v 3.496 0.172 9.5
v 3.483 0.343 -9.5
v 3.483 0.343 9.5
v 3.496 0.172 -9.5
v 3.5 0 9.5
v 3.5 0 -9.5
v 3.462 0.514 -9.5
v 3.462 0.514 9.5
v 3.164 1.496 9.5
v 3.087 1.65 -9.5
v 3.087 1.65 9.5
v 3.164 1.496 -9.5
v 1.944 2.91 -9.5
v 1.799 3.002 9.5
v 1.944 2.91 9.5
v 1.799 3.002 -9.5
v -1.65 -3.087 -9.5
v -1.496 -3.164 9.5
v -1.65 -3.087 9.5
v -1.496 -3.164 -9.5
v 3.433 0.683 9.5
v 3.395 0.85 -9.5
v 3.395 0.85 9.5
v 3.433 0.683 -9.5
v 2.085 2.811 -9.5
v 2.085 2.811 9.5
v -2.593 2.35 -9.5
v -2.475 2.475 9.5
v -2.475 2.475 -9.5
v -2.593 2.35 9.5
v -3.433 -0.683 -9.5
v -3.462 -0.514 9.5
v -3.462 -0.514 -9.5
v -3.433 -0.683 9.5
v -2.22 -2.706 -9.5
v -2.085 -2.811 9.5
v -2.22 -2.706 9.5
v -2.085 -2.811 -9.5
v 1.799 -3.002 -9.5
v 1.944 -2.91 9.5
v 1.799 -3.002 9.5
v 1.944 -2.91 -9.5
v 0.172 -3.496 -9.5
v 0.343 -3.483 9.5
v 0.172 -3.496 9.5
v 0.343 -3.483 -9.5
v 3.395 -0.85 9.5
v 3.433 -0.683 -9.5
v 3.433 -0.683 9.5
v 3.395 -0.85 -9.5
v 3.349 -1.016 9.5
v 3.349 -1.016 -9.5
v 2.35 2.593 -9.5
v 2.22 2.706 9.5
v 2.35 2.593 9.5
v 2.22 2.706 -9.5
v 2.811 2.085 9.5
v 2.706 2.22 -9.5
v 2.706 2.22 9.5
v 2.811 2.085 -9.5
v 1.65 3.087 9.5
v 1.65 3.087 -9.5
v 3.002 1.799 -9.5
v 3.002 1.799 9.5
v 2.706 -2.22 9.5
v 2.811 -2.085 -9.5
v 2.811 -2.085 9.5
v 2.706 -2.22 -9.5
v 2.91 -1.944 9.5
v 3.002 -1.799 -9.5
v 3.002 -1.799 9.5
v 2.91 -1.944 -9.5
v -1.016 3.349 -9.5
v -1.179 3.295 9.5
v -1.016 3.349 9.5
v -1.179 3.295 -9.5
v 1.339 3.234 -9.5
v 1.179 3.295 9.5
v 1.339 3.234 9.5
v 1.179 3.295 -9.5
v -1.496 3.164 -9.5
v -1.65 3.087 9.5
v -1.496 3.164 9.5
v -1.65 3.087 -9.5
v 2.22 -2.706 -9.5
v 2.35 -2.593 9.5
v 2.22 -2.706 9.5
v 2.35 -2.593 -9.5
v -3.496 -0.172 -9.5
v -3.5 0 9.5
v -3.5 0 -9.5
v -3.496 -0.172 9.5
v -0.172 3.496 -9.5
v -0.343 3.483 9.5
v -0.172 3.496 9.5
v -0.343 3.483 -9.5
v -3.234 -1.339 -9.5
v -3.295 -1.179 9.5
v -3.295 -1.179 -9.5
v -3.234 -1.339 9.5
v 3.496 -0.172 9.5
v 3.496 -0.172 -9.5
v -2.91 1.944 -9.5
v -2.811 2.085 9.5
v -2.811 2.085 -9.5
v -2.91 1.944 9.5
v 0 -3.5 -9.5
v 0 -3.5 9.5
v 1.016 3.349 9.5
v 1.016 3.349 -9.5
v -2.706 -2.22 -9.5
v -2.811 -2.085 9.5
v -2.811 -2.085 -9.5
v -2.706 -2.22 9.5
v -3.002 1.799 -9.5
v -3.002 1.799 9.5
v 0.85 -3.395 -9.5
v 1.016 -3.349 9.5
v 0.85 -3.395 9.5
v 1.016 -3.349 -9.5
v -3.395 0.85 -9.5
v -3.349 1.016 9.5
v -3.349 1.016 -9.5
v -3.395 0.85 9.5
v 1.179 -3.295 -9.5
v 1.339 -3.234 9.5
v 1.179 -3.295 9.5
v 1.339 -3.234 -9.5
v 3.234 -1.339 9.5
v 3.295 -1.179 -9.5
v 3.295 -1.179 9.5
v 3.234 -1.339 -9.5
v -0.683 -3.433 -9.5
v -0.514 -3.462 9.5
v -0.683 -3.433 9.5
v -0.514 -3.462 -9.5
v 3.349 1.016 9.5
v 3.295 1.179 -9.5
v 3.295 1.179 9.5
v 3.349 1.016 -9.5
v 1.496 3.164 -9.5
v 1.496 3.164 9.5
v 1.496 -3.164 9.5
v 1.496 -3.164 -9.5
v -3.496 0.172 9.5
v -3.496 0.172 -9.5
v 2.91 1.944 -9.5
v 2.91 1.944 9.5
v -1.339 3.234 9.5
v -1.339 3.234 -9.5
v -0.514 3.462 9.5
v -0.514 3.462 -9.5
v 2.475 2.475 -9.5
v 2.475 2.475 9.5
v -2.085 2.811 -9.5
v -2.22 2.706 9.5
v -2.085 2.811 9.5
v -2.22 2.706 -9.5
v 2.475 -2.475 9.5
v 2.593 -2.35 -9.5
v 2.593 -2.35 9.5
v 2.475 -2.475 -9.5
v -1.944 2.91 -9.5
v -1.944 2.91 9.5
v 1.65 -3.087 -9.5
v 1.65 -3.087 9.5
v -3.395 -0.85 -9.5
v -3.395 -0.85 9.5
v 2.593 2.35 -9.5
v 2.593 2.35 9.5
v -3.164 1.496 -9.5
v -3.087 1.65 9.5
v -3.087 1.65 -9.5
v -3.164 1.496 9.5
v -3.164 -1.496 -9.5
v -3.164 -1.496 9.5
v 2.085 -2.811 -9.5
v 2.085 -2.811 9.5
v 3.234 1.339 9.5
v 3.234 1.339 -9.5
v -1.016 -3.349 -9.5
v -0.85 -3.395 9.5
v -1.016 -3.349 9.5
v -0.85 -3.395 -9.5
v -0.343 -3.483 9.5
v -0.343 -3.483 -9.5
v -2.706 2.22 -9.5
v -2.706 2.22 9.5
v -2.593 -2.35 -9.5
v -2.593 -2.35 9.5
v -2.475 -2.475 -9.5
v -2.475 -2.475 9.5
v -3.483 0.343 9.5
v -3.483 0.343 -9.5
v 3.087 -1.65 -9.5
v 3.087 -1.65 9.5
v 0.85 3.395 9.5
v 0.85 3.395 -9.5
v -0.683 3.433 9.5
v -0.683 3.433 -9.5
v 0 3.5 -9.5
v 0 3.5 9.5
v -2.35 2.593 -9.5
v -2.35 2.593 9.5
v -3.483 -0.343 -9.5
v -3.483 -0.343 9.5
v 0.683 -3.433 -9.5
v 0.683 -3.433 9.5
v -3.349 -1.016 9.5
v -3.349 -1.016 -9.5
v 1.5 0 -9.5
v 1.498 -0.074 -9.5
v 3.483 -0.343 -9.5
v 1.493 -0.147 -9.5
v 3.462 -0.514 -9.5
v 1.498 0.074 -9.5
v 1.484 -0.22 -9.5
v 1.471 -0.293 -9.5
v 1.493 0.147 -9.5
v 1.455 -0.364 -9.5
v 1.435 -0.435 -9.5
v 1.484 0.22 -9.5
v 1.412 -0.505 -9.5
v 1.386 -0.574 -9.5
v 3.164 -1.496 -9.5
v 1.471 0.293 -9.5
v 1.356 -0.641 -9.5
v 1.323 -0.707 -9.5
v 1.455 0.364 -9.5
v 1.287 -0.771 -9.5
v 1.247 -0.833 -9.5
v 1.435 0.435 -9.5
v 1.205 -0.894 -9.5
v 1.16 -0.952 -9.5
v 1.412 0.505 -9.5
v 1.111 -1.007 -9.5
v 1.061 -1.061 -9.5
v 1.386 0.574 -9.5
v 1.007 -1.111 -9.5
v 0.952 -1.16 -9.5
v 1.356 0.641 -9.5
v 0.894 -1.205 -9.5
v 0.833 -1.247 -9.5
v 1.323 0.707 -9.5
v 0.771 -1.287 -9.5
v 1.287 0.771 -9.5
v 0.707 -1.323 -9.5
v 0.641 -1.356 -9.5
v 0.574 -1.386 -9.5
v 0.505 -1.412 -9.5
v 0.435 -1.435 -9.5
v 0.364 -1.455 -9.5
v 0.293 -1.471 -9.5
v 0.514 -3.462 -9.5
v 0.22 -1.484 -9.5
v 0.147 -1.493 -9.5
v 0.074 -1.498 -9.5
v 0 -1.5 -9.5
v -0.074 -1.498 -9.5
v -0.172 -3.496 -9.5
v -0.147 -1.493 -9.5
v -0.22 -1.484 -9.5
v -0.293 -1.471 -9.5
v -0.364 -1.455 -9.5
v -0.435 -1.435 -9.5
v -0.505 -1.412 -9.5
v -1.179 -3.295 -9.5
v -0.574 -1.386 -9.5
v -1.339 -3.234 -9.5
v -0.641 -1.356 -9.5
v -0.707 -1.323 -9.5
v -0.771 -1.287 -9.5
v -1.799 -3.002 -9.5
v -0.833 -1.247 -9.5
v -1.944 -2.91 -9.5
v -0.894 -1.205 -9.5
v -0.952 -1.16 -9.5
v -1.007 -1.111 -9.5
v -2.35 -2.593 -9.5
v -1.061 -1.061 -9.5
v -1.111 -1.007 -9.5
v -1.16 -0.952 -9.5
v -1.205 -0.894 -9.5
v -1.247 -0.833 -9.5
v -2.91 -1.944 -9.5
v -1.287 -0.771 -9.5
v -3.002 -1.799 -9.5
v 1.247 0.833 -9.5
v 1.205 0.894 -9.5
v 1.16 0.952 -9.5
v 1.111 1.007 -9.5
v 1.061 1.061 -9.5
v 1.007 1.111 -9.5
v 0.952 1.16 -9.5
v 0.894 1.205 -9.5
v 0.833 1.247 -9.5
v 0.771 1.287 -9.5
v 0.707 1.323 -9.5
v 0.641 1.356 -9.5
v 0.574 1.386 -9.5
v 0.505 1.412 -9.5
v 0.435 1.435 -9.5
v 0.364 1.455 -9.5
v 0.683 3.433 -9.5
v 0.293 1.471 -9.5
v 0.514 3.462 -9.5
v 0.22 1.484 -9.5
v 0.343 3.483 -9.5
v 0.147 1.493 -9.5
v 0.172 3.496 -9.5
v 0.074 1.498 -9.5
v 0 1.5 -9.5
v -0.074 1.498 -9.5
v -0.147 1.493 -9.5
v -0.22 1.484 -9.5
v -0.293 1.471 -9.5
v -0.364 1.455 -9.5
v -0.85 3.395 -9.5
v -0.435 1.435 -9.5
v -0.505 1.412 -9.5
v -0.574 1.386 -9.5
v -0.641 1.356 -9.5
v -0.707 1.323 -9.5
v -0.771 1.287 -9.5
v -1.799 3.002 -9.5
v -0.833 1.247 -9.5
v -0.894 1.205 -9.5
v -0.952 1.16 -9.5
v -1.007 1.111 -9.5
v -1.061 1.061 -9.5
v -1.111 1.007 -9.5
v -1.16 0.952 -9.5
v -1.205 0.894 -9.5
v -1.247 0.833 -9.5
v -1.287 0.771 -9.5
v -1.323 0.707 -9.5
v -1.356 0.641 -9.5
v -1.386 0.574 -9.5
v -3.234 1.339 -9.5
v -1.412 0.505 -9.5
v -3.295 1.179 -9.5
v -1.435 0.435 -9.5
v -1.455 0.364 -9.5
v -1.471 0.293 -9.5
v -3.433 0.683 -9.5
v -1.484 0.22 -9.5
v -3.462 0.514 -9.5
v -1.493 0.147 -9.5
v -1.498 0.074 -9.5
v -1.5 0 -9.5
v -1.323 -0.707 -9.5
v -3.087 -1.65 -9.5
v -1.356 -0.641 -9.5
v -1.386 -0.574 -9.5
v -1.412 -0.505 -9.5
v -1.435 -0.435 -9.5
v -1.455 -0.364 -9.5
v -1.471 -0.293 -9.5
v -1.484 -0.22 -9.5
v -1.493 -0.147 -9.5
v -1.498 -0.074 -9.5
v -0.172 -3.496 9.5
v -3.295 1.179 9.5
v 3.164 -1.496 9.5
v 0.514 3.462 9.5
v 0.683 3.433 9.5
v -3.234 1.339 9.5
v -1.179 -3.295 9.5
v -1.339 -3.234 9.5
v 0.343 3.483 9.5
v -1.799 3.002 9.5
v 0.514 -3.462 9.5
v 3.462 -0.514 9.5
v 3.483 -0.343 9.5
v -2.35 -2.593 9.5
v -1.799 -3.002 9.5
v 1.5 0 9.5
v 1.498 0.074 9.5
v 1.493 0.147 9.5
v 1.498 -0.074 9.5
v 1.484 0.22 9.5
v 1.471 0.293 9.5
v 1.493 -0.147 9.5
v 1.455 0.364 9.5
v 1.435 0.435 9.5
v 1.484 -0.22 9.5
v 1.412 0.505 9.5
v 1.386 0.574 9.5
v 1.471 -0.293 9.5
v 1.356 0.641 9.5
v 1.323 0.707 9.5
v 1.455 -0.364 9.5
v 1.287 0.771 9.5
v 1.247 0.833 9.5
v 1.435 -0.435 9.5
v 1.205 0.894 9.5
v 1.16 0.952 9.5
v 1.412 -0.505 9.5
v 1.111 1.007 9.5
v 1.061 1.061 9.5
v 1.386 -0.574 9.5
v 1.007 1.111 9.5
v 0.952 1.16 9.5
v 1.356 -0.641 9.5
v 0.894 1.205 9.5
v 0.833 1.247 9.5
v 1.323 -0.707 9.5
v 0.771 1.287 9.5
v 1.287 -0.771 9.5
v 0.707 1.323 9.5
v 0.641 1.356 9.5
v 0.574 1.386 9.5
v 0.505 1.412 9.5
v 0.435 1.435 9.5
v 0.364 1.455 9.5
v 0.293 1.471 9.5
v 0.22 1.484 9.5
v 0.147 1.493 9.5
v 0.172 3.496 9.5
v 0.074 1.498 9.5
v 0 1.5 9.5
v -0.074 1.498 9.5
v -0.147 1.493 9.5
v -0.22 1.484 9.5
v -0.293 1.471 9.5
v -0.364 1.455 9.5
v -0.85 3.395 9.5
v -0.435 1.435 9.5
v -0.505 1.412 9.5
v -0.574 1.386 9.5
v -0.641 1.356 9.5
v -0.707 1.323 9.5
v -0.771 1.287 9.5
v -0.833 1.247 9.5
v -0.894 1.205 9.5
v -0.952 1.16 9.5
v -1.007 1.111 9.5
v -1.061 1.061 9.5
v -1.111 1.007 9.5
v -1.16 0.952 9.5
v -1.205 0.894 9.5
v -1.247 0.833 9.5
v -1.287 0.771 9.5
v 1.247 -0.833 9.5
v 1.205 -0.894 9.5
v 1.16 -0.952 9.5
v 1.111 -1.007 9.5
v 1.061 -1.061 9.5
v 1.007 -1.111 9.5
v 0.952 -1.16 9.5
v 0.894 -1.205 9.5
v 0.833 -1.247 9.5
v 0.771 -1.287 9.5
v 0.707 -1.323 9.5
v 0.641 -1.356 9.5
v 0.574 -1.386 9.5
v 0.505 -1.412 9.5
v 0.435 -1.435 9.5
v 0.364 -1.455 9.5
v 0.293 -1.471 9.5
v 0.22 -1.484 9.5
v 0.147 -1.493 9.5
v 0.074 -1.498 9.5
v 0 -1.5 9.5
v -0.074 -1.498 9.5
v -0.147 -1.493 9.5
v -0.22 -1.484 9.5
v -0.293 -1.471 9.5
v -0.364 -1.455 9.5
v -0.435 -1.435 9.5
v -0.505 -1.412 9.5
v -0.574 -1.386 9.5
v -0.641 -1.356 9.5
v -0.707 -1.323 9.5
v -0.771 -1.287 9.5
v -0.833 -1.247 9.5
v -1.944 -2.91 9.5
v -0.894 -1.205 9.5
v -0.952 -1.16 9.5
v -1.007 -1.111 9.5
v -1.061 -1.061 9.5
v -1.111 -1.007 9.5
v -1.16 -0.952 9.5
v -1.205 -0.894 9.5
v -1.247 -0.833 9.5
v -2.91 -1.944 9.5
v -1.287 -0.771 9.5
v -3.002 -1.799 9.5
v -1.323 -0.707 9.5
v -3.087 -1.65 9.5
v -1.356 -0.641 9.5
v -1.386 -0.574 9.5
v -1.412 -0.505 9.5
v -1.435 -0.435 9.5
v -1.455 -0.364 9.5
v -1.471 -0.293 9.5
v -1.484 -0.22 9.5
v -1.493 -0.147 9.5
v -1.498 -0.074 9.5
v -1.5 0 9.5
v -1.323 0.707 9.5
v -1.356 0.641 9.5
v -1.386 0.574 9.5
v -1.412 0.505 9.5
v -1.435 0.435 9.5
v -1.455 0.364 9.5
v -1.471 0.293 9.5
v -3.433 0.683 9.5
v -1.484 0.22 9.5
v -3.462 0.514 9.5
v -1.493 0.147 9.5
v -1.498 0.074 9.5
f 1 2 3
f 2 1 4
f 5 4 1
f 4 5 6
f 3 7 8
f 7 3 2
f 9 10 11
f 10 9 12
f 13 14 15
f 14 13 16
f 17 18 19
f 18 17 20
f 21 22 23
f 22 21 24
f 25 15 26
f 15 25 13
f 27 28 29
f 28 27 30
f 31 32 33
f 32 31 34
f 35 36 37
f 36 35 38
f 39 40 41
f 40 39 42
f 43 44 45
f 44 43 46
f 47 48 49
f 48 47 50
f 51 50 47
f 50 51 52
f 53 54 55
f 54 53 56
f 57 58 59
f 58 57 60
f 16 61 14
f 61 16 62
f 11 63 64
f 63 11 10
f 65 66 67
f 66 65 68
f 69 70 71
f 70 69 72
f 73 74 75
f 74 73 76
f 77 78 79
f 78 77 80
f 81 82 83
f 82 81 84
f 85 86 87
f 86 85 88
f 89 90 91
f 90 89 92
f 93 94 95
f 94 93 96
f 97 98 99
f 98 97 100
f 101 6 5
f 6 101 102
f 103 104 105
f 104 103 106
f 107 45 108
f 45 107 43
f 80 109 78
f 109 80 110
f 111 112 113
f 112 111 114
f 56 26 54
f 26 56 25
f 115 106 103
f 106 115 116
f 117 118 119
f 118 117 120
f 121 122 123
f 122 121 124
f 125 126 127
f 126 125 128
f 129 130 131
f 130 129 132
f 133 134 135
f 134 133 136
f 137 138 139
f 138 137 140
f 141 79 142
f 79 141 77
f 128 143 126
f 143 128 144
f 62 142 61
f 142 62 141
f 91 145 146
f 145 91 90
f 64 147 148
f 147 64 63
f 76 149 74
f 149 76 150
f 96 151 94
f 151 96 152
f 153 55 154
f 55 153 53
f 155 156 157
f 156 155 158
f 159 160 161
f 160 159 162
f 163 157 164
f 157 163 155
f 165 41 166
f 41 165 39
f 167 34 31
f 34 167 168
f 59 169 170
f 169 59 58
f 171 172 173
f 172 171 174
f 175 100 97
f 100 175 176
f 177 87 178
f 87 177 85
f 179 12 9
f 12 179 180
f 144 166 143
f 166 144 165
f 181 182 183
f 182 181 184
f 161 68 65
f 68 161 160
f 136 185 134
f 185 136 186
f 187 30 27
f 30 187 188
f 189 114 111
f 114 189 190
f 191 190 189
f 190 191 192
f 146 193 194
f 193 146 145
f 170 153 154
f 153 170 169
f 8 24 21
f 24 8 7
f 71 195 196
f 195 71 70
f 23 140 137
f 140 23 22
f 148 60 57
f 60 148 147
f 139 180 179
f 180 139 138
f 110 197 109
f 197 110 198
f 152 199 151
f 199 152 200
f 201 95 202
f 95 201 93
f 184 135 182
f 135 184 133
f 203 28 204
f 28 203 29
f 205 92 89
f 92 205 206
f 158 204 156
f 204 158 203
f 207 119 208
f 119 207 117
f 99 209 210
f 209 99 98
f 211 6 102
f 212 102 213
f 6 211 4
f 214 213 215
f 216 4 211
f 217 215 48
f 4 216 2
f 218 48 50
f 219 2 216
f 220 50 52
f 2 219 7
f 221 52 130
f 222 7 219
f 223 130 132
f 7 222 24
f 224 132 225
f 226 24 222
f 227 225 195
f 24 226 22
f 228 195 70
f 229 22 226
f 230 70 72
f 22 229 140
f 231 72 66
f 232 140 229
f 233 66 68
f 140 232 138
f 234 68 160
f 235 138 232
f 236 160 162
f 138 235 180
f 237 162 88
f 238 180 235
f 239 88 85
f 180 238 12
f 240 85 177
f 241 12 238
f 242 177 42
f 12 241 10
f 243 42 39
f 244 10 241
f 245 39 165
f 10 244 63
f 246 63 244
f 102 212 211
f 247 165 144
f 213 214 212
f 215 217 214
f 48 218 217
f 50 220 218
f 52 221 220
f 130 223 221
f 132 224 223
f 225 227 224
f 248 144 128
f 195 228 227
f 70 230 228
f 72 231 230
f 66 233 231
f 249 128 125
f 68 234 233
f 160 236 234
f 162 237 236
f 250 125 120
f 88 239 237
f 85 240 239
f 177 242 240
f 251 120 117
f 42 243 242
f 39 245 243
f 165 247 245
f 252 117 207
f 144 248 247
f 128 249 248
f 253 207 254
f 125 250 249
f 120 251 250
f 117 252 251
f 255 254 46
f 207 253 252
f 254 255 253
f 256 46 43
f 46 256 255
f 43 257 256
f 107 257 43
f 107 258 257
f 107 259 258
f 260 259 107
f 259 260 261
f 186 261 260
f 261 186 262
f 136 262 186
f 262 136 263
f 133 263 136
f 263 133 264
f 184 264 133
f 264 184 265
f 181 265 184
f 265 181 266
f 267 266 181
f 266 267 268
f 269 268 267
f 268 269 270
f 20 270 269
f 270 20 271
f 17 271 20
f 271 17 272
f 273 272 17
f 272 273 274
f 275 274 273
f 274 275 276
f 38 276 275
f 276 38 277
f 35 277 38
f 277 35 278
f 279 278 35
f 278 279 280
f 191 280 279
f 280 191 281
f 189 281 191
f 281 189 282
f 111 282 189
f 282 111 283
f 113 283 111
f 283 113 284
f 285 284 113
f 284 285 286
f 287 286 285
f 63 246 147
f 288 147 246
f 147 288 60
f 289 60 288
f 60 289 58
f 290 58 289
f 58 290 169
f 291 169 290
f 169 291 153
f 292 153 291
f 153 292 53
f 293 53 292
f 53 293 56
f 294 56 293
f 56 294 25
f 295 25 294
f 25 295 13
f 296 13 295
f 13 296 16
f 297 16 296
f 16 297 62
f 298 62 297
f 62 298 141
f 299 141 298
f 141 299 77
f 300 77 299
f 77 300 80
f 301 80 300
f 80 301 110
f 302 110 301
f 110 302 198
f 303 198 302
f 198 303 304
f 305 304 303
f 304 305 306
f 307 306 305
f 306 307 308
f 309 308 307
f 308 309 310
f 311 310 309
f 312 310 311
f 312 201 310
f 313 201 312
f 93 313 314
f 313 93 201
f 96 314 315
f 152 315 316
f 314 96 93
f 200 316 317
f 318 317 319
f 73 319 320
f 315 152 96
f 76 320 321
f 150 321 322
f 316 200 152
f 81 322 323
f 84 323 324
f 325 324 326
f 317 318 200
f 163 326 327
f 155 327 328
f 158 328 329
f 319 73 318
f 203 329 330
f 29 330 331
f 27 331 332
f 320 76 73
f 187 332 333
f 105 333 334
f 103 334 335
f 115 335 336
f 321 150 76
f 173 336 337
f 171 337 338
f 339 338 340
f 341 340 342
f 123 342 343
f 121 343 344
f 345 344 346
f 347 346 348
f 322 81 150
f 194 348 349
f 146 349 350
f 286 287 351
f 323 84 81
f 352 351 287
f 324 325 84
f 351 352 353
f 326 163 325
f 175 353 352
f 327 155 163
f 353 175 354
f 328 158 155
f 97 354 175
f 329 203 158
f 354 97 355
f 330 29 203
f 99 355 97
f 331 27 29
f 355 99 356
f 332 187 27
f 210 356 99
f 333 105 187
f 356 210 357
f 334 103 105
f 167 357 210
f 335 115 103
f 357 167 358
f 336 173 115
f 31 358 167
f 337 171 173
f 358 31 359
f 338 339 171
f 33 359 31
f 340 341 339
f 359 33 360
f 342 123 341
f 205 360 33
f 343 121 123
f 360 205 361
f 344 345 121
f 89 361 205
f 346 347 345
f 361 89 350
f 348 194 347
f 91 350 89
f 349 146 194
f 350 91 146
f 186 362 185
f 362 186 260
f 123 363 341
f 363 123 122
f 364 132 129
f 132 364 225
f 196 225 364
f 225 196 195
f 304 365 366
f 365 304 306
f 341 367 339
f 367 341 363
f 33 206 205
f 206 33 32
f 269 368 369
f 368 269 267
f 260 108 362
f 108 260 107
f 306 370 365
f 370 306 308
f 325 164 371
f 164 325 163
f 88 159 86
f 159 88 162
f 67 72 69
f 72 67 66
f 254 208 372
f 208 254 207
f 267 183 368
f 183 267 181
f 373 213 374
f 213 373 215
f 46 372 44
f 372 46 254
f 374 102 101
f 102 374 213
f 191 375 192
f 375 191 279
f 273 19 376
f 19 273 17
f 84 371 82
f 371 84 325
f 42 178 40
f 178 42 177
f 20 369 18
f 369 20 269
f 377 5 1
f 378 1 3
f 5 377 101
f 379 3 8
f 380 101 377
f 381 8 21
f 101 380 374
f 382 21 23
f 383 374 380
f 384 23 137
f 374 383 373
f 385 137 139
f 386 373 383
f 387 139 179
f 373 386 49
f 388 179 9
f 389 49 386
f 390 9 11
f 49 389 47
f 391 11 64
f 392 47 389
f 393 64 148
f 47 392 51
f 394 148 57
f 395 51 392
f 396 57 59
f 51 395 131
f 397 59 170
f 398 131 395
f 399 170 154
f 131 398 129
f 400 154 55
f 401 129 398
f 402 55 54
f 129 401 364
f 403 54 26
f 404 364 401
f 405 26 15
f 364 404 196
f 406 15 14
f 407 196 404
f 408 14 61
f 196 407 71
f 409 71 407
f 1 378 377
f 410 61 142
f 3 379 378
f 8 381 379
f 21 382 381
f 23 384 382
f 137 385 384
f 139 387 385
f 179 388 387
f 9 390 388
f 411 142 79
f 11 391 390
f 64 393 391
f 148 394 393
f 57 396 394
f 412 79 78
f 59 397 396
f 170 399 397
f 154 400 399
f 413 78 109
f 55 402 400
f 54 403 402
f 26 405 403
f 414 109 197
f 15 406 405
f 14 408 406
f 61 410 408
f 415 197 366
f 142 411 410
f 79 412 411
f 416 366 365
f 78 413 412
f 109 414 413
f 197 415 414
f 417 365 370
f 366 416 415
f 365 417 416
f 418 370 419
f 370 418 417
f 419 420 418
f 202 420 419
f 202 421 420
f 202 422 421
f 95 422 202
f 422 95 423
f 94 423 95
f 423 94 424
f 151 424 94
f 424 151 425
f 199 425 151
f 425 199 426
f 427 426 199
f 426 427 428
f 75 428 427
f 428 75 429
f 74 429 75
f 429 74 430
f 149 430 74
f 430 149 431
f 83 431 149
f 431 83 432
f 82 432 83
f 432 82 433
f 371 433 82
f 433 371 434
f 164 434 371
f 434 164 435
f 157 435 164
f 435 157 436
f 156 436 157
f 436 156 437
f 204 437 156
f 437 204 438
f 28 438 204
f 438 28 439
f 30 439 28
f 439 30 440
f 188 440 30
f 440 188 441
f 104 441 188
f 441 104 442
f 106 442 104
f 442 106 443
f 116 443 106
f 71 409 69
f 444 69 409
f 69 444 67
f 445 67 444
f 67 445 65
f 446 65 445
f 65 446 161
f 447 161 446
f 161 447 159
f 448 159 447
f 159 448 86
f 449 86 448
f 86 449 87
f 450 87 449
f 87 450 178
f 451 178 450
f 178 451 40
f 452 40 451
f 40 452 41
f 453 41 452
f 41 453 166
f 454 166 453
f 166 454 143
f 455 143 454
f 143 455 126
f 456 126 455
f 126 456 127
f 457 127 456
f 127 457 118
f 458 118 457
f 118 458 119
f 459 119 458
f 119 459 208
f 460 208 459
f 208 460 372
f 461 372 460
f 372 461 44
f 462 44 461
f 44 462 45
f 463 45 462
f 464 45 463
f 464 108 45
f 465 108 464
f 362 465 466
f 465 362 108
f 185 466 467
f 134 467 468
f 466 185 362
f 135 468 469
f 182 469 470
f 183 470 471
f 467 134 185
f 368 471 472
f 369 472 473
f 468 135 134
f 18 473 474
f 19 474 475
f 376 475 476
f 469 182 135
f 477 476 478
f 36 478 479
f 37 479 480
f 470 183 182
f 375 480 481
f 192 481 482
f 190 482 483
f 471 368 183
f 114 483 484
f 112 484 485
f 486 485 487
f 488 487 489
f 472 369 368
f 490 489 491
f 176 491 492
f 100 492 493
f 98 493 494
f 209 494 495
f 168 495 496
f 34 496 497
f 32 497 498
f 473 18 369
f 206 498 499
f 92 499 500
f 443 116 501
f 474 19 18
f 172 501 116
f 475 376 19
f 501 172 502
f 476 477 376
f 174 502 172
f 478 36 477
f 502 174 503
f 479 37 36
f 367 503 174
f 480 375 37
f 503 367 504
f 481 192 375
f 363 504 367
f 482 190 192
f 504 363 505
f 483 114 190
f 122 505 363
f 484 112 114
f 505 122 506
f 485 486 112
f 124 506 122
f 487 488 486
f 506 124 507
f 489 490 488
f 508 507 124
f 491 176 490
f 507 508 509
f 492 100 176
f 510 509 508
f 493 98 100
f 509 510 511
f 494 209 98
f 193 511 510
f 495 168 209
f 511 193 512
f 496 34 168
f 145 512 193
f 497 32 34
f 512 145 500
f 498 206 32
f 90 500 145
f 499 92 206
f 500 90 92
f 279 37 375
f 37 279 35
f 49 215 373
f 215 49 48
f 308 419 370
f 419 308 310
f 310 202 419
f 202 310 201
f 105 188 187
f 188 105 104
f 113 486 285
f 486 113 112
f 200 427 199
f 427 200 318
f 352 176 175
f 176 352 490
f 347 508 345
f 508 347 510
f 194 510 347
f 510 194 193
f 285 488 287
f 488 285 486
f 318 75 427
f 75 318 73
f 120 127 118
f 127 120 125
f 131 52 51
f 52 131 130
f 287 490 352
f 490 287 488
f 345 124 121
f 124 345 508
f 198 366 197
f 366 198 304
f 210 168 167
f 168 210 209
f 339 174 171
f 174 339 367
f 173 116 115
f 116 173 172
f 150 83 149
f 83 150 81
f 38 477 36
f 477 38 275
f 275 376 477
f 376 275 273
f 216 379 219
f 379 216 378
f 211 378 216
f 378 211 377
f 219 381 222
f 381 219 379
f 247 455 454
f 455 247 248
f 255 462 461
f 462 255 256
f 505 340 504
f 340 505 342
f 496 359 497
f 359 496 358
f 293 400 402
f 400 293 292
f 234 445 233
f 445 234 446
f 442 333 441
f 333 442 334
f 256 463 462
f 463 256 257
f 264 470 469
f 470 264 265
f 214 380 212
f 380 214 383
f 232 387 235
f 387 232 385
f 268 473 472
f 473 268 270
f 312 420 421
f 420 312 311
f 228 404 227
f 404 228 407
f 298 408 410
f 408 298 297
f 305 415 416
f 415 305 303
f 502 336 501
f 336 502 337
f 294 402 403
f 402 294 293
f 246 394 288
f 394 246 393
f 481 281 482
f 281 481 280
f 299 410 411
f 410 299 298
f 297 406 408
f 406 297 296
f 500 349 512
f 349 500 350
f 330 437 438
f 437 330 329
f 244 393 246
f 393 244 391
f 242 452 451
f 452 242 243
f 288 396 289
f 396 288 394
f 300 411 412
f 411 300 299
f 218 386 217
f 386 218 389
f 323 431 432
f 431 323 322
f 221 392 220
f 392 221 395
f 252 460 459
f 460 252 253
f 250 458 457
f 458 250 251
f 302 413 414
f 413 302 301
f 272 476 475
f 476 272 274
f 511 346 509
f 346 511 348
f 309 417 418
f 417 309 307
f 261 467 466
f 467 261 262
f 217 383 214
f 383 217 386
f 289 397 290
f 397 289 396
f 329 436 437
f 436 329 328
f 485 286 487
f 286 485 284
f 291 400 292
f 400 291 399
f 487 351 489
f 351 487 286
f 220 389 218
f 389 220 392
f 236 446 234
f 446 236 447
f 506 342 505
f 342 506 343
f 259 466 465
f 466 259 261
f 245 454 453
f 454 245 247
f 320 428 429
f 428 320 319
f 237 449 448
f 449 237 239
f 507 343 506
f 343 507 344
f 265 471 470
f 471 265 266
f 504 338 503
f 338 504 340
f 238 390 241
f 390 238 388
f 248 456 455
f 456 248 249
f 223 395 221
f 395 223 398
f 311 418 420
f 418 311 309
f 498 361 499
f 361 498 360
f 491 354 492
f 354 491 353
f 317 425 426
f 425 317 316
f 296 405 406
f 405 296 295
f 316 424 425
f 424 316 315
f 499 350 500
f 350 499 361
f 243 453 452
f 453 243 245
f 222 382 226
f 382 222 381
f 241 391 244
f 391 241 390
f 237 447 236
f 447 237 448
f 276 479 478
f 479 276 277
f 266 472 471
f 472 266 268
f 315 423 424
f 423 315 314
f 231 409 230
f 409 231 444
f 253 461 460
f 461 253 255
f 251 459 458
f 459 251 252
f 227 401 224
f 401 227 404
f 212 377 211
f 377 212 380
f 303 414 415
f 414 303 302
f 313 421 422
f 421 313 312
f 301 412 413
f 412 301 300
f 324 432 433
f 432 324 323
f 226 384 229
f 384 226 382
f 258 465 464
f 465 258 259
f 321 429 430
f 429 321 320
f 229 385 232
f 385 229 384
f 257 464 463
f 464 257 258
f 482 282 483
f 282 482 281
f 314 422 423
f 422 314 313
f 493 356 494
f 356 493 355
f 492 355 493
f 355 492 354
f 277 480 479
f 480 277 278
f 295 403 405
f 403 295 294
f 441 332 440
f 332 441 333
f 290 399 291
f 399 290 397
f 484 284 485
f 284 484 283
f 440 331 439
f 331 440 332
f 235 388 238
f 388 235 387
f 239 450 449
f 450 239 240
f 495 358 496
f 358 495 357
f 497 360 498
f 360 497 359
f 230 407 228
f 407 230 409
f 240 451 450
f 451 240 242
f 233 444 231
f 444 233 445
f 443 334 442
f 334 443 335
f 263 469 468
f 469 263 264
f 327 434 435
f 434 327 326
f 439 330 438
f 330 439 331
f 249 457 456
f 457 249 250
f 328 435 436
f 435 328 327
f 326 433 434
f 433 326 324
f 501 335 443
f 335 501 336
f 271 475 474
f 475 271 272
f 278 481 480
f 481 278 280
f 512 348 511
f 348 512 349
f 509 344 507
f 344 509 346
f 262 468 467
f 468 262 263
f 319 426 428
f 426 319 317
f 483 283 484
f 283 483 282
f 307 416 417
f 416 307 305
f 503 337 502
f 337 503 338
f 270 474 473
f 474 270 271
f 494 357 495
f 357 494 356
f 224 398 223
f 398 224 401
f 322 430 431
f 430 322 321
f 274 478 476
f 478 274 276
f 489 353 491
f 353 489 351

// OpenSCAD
$fn = 128;

bore_d = 3.0;
od_d   = 7.0;
len_h  = 19.0;

eps = 0.02;

difference() {
    cylinder(h = len_h, d = od_d, center = true);
    cylinder(h = len_h + 2*eps, d = bore_d, center = true);
}
